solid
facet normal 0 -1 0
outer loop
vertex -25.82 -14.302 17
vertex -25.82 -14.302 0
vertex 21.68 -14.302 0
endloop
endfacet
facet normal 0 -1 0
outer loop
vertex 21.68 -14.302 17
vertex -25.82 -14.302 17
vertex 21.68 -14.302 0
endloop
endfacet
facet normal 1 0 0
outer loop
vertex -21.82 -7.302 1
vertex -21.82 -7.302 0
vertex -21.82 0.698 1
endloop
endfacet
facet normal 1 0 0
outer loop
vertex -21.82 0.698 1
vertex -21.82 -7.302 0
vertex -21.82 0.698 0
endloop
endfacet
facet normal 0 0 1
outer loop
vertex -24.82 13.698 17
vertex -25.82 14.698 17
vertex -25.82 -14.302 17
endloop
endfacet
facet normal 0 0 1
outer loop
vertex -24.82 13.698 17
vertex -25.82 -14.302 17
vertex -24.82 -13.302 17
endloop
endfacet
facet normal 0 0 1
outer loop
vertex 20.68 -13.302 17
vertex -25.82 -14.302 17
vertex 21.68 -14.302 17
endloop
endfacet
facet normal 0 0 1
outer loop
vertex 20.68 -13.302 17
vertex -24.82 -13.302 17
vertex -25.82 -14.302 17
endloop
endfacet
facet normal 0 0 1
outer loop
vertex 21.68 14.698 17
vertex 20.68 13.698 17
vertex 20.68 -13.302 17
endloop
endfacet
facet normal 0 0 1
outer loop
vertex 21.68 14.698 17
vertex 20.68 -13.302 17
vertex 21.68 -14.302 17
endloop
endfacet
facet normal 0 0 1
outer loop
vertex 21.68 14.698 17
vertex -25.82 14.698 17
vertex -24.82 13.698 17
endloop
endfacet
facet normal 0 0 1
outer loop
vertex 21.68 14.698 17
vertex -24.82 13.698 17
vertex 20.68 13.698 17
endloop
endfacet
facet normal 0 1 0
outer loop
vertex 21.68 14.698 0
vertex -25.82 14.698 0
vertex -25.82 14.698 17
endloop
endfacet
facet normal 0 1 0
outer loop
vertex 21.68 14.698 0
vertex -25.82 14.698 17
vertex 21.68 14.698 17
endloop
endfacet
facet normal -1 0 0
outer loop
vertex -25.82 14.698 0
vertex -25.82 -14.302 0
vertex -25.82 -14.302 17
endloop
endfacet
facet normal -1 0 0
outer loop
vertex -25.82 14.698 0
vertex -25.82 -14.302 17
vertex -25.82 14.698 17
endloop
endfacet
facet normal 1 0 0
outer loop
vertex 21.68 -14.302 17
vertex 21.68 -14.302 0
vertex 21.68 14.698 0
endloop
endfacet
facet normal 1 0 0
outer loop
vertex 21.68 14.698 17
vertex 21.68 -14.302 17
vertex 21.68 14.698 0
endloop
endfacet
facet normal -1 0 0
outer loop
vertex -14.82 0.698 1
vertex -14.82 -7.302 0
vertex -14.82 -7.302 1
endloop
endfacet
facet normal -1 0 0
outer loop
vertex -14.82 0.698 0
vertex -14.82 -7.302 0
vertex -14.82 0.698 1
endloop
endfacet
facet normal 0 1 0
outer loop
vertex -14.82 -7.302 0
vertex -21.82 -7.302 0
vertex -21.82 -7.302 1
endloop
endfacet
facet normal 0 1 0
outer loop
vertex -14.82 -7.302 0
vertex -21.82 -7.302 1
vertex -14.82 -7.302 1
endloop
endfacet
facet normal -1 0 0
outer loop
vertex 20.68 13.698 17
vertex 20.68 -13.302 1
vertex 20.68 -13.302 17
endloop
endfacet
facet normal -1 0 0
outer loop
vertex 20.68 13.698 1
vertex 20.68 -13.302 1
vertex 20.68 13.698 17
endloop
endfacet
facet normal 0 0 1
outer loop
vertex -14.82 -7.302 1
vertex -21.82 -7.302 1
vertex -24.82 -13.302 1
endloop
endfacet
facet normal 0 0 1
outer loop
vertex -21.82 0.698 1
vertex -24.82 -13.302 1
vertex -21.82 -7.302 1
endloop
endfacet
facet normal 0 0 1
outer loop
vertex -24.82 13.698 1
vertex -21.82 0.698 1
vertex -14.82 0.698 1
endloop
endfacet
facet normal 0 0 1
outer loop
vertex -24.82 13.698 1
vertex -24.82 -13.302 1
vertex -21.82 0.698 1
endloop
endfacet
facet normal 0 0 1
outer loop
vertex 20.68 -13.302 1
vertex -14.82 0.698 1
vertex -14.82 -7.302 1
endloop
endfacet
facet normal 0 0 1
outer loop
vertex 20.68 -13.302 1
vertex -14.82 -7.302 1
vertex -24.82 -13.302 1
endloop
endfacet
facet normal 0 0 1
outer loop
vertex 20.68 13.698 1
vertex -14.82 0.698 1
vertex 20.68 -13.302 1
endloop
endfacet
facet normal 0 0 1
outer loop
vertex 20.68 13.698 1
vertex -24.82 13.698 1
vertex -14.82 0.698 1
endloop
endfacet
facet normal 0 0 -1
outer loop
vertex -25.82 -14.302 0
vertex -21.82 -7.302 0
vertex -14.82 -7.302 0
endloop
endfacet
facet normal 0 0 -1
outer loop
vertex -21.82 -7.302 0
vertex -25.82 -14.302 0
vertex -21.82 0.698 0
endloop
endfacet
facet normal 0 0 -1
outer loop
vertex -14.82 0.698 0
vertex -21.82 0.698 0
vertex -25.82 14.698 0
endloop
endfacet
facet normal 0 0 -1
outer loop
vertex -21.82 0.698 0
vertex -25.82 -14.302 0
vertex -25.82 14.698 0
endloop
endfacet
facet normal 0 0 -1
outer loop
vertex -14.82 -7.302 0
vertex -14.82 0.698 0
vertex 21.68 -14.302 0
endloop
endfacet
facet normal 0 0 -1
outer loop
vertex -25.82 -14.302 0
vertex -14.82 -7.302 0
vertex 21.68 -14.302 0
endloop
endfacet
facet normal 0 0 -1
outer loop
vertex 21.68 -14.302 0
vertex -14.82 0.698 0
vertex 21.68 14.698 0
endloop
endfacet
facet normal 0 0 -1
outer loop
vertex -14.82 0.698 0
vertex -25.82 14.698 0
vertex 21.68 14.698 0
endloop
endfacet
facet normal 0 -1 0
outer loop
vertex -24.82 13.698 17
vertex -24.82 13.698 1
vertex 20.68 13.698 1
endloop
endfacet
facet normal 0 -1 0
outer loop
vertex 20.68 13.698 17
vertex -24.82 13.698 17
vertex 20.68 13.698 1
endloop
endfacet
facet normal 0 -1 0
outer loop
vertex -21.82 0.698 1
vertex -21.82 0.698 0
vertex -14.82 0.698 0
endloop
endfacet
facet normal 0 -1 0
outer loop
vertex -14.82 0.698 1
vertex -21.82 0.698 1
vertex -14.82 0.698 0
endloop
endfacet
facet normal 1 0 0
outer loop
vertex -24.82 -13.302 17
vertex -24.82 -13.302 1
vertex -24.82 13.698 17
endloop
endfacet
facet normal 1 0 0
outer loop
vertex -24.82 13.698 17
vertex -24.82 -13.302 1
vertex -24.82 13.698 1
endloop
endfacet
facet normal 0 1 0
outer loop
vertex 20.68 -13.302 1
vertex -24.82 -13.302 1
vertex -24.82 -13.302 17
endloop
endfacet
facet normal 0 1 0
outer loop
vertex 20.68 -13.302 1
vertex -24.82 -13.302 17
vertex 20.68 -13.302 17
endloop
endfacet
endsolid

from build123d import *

# Parameters (mm, degrees)
F0_W     = 45.5
F0_H     = 27
F1_DEPTH = 1
F0_W_2   = 47.5
F0_H_2   = 29
F2_DEPTH = 17
F3_W     = 7
F3_H     = 8
F4_DEPTH = 17.001


with BuildPart() as f1:
    # F0 (on Top) → F1 (new body)
    with BuildSketch(Plane.XY):
        with Locations((-2.069812, 0.198113)):
            Rectangle(F0_W, F0_H)
    extrude(amount=F1_DEPTH)

    # F0 (on Top) → F2 (join)
    with BuildSketch(Plane.XY):
        with Locations((-2.069812, 0.198113)):
            Rectangle(F0_W_2, F0_H_2)
        with Locations((-2.069812, 0.198113)):
            Rectangle(F0_W, F0_H, mode=Mode.SUBTRACT)
    extrude(amount=F2_DEPTH)

    # F3 (on face) → F4 (cut, through all)
    with BuildSketch(Plane.XY):
        with Locations((-18.319812, -3.301887)):
            Rectangle(F3_W, F3_H)
    extrude(amount=F4_DEPTH, mode=Mode.SUBTRACT)


solid = f1.part
